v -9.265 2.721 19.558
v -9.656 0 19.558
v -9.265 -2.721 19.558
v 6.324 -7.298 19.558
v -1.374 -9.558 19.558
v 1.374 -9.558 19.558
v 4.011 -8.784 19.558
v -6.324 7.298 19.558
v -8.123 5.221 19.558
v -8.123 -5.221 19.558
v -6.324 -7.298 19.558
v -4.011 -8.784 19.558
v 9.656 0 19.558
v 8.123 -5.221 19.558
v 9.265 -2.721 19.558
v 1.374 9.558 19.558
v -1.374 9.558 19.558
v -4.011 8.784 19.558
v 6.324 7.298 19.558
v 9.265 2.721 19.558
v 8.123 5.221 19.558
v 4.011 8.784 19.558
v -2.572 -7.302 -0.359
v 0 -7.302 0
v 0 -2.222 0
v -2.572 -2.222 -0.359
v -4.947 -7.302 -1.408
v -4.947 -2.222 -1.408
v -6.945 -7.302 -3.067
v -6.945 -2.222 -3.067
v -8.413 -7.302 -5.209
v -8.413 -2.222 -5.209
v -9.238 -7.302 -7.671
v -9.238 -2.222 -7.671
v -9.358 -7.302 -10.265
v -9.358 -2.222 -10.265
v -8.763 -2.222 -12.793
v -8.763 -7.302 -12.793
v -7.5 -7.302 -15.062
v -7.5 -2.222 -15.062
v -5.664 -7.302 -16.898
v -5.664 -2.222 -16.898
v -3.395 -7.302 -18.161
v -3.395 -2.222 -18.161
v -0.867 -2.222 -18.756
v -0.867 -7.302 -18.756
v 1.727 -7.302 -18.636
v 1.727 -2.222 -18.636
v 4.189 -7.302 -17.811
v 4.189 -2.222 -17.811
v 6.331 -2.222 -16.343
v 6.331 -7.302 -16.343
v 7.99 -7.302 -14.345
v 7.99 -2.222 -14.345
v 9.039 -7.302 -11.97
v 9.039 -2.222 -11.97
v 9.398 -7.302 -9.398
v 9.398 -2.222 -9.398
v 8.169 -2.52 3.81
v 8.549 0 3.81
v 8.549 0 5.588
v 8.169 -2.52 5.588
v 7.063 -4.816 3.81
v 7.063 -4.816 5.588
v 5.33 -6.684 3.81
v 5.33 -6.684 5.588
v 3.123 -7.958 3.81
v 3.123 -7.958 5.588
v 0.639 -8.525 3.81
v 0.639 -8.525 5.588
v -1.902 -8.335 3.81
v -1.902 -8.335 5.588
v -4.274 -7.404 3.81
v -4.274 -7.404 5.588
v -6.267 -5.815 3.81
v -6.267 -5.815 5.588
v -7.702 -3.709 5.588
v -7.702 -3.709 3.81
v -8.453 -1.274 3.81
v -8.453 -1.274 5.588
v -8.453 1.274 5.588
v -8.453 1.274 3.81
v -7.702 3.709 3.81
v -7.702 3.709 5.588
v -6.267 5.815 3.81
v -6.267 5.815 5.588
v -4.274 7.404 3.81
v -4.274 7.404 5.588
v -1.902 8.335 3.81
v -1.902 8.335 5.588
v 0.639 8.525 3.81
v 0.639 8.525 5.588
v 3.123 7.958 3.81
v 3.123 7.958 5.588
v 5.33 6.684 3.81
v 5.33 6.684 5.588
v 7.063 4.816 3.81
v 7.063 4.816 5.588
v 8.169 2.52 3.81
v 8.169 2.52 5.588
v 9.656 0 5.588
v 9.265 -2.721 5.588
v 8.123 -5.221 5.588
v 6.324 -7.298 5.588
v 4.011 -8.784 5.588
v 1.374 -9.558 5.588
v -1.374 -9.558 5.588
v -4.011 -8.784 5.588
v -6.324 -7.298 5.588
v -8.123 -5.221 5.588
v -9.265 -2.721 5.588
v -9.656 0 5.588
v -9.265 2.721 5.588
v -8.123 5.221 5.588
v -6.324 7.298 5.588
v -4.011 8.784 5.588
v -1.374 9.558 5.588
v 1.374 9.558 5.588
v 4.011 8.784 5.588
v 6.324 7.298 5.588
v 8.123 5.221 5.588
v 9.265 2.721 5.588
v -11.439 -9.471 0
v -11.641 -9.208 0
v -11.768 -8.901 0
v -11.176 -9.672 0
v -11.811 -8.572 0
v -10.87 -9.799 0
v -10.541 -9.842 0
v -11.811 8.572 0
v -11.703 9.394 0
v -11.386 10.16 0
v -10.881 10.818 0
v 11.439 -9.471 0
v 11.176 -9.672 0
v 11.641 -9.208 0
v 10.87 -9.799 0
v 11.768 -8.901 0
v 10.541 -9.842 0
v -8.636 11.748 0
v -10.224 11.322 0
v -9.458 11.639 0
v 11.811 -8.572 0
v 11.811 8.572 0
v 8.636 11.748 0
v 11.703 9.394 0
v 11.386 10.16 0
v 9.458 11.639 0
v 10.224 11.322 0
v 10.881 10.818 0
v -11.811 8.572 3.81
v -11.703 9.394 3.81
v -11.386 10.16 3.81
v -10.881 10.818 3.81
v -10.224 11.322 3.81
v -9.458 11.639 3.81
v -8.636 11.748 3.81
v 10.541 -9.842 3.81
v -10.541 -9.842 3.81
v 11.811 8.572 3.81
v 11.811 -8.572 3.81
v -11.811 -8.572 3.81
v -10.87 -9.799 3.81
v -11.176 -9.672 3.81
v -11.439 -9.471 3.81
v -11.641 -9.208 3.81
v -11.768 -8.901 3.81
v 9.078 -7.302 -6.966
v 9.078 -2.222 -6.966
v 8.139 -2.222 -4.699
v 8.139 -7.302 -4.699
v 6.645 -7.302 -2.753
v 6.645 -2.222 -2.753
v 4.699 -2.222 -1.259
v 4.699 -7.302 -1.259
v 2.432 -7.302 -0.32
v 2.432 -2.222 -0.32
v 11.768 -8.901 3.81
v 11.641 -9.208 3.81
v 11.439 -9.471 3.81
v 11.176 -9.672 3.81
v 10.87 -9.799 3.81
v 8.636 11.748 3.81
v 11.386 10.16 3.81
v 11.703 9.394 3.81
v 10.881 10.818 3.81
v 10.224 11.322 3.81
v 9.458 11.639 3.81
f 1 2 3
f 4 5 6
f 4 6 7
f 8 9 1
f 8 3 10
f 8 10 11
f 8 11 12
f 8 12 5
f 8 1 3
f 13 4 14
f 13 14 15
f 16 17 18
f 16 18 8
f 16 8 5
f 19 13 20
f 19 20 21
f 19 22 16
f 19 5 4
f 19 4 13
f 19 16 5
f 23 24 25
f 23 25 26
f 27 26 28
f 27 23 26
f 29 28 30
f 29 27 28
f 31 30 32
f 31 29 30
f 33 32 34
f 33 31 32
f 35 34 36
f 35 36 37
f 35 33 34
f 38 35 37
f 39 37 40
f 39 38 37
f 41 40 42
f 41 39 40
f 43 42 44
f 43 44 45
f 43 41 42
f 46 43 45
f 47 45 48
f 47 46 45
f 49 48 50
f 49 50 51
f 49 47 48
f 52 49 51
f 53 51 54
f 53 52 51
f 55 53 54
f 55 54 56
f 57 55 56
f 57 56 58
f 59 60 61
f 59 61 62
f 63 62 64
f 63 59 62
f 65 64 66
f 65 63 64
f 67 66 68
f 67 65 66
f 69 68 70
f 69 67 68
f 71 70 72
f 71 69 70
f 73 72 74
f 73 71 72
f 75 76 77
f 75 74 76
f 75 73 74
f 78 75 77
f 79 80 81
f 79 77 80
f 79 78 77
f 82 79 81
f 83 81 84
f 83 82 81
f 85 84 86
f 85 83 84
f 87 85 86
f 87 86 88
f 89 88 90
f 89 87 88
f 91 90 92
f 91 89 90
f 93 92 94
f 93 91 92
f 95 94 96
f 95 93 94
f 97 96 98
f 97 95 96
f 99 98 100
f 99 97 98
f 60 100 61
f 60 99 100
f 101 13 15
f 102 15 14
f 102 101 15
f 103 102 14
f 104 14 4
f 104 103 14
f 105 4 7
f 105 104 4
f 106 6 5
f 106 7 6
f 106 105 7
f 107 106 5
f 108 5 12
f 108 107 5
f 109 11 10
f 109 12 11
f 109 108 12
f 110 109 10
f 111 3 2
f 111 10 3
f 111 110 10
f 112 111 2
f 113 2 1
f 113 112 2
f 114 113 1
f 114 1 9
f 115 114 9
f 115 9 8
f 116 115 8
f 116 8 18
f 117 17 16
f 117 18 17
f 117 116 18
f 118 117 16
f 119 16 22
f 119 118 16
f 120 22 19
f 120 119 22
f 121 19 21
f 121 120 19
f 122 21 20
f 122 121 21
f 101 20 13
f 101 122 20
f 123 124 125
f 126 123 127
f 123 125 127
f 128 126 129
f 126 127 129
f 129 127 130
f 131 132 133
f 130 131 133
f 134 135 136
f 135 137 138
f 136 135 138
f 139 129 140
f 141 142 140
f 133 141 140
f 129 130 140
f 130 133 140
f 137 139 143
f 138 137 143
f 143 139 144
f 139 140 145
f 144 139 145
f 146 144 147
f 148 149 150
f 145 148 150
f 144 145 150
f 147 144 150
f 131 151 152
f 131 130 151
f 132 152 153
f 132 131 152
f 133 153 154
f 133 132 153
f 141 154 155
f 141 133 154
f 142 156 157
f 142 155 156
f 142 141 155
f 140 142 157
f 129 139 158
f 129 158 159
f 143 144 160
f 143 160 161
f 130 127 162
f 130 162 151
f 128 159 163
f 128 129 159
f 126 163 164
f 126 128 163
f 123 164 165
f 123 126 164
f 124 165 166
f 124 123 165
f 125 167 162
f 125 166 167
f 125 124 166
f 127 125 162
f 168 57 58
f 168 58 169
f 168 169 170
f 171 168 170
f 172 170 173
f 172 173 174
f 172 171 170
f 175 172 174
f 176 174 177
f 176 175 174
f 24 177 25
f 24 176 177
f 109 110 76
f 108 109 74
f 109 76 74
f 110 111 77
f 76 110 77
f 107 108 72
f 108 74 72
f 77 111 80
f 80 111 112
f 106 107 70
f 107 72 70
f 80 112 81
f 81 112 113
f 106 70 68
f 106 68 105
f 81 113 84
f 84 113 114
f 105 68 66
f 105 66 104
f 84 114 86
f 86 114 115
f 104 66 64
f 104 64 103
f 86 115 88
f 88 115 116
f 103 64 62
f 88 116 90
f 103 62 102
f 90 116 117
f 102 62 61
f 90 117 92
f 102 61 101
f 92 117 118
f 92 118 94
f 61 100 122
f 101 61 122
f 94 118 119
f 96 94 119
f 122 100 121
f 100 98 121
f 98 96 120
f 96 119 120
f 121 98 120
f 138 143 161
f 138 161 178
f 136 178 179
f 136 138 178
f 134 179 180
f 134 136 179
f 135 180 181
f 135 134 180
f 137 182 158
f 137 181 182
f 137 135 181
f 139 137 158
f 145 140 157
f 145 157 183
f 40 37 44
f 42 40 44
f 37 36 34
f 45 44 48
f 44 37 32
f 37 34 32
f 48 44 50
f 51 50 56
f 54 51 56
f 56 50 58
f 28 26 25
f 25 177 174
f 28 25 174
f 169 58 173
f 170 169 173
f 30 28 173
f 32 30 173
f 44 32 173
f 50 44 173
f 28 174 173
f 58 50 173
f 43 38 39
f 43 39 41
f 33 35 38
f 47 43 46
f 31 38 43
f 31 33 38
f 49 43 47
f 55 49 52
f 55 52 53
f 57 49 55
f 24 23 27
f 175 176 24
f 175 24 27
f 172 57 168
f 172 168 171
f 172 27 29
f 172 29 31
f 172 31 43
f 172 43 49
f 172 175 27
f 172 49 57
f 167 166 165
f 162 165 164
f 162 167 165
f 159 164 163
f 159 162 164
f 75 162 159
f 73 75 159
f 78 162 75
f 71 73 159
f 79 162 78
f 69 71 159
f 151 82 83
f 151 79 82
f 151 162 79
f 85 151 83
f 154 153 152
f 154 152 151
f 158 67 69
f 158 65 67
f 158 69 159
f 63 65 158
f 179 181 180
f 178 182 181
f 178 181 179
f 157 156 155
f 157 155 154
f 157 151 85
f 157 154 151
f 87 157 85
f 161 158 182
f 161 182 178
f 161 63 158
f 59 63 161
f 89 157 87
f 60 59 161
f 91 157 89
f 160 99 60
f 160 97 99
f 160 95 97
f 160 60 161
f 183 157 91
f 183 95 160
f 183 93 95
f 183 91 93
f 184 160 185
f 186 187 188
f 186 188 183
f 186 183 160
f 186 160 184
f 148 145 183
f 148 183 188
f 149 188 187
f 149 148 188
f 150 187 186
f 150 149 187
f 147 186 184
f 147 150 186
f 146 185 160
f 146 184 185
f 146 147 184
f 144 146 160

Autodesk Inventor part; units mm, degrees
ref_plane "YZ Plane" through (0, 0, 0) normal (1, 0, 0) x (0, 1, 0)
ref_plane "XZ Plane" through (0, 0, 0) normal (0, 1, 0) x (-1, 0, 0)
ref_plane "XY Plane" through (0, 0, 0) normal (0, 0, 1) x (1, 0, 0)
sketch "Sketch1" plane through (0, 0, 0) normal (0, 0, 1) x (1, 0, 0)
  line L0 (-8.636, 11.7475) -> (8.636, 11.7475)
  line L1 (11.811, 8.5725) -> (11.811, -8.5725)
  line L2 (10.541, -9.8425) -> (-10.541, -9.8425)
  line L3 (-11.811, -8.5725) -> (-11.811, 8.5725)
  arc A0 (-8.636, 11.7475) -> (-11.811, 8.5725) centre (-8.636, 8.5725) ccw
  arc A1 (11.811, 8.5725) -> (8.636, 11.7475) centre (8.636, 8.5725) ccw
  arc A2 (-11.811, -8.5725) -> (-10.541, -9.8425) centre (-10.541, -8.5725) ccw
  arc A3 (10.541, -9.8425) -> (11.811, -8.5725) centre (10.541, -8.5725) ccw
  arc A4 (-11.811, -8.5725) -> (-10.541, -9.8425) centre (-10.541, -8.5725) ccw
  point P0 (0, 0)
  point P1 (0, 11.7475)
  point P2 (11.811, 0)
  dimension "d0" = 23.622
  dimension "d1" = 21.59
  dimension "d2" = 3.175
  dimension "d3" = 1.27
  dimension "d4" = 1.27
extrude "Extrusion1" add sketch "Sketch1" along normal blind 3.81
ref_plane "Work Plane1" through (-10.541, -7.3025, 0) normal (0, -1, 0) x (1, 0, 0)
sketch "Sketch2" plane through (-10.541, -7.3025, 0) normal (0, -1, 0) x (1, 0, 0)
  circle A0 centre (10.541, -9.398) radius 9.398
  line L0 (0, 0) -> (21.082, 0) projected
  point P0 (10.541, 0)
  point P1 (10.541, 0)
  dimension "d8" = 18.796
extrude "Extrusion2" add sketch "Sketch2" against normal blind 5.08
sketch "Sketch3" plane through (0, 0, 3.81) normal (0, 0, 1) x (1, 0, 0)
  circle A0 centre (0, 0) radius 8.5489
extrude "Extrusion3" add sketch "Sketch3" along normal blind 1.778
sketch "Sketch4" plane through (0, 0, 5.588) normal (0, 0, 1) x (1, 0, 0)
  circle A0 centre (0, 0) radius 9.6564
extrude "Extrusion4" add sketch "Sketch4" along normal blind 13.97
properties part number "Light Circuit"
